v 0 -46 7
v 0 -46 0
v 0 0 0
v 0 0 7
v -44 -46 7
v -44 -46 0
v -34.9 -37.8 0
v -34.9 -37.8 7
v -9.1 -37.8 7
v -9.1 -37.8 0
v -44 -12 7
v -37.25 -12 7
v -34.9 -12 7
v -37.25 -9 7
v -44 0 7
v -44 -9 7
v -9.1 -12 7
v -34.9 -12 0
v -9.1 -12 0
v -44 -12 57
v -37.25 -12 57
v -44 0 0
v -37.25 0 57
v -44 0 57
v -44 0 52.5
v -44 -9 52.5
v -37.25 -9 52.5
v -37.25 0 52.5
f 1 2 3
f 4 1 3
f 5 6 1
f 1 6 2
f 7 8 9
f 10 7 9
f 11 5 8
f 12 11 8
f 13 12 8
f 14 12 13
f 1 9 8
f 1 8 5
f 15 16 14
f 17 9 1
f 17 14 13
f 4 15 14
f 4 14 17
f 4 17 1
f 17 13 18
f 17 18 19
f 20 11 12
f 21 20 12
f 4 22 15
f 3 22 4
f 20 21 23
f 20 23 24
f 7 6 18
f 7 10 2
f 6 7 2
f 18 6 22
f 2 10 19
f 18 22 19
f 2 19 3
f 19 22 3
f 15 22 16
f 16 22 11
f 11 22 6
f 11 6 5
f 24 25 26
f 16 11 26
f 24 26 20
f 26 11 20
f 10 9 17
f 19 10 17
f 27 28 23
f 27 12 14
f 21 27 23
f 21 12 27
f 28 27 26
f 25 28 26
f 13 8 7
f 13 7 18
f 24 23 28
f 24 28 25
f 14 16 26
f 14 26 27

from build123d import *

# Parameters (mm, degrees)
SKETCH_W     = 44
SKETCH_H     = 46
PAD_DEPTH    = 7
SKETCH001_W  = 25.8
SKETCH001_H  = 25.8
POCKET_DEPTH = 8
SKETCH002_W  = 6.75
SKETCH002_H  = 3
PAD001_DEPTH = 50
SKETCH006_W  = 6.75
SKETCH006_H  = 4.5
PAD017_DEPTH = 9


with BuildPart() as part:
    # Sketch → Pad (new body)
    with BuildSketch(Plane.XY):
        with Locations((-22, -23)):
            Rectangle(SKETCH_W, SKETCH_H)
    extrude(amount=PAD_DEPTH)

    # Sketch001 (on Face6 of Pad) → Pocket (cut)
    with BuildSketch(Plane.XY.offset(7)):
        with Locations((-22, -24.9)):
            Rectangle(SKETCH001_W, SKETCH001_H)
    extrude(amount=-POCKET_DEPTH, mode=Mode.SUBTRACT)

    # Sketch002 (on Face5 of Pocket) → Pad001 (new body)
    with BuildSketch(Plane.XY.offset(7)):
        with Locations((-40.625, -10.5)):
            Rectangle(SKETCH002_W, SKETCH002_H)
    extrude(amount=PAD001_DEPTH)

    # Sketch006 (on Face14 of Pad001) → Pad017 (new body)
    with BuildSketch(Plane(origin=(0, -9, 0), x_dir=(-1, 0, 0), z_dir=(0, 1, 0))):
        with Locations((40.625, 54.75)):
            Rectangle(SKETCH006_W, SKETCH006_H)
    extrude(amount=PAD017_DEPTH)


solid = part.part
